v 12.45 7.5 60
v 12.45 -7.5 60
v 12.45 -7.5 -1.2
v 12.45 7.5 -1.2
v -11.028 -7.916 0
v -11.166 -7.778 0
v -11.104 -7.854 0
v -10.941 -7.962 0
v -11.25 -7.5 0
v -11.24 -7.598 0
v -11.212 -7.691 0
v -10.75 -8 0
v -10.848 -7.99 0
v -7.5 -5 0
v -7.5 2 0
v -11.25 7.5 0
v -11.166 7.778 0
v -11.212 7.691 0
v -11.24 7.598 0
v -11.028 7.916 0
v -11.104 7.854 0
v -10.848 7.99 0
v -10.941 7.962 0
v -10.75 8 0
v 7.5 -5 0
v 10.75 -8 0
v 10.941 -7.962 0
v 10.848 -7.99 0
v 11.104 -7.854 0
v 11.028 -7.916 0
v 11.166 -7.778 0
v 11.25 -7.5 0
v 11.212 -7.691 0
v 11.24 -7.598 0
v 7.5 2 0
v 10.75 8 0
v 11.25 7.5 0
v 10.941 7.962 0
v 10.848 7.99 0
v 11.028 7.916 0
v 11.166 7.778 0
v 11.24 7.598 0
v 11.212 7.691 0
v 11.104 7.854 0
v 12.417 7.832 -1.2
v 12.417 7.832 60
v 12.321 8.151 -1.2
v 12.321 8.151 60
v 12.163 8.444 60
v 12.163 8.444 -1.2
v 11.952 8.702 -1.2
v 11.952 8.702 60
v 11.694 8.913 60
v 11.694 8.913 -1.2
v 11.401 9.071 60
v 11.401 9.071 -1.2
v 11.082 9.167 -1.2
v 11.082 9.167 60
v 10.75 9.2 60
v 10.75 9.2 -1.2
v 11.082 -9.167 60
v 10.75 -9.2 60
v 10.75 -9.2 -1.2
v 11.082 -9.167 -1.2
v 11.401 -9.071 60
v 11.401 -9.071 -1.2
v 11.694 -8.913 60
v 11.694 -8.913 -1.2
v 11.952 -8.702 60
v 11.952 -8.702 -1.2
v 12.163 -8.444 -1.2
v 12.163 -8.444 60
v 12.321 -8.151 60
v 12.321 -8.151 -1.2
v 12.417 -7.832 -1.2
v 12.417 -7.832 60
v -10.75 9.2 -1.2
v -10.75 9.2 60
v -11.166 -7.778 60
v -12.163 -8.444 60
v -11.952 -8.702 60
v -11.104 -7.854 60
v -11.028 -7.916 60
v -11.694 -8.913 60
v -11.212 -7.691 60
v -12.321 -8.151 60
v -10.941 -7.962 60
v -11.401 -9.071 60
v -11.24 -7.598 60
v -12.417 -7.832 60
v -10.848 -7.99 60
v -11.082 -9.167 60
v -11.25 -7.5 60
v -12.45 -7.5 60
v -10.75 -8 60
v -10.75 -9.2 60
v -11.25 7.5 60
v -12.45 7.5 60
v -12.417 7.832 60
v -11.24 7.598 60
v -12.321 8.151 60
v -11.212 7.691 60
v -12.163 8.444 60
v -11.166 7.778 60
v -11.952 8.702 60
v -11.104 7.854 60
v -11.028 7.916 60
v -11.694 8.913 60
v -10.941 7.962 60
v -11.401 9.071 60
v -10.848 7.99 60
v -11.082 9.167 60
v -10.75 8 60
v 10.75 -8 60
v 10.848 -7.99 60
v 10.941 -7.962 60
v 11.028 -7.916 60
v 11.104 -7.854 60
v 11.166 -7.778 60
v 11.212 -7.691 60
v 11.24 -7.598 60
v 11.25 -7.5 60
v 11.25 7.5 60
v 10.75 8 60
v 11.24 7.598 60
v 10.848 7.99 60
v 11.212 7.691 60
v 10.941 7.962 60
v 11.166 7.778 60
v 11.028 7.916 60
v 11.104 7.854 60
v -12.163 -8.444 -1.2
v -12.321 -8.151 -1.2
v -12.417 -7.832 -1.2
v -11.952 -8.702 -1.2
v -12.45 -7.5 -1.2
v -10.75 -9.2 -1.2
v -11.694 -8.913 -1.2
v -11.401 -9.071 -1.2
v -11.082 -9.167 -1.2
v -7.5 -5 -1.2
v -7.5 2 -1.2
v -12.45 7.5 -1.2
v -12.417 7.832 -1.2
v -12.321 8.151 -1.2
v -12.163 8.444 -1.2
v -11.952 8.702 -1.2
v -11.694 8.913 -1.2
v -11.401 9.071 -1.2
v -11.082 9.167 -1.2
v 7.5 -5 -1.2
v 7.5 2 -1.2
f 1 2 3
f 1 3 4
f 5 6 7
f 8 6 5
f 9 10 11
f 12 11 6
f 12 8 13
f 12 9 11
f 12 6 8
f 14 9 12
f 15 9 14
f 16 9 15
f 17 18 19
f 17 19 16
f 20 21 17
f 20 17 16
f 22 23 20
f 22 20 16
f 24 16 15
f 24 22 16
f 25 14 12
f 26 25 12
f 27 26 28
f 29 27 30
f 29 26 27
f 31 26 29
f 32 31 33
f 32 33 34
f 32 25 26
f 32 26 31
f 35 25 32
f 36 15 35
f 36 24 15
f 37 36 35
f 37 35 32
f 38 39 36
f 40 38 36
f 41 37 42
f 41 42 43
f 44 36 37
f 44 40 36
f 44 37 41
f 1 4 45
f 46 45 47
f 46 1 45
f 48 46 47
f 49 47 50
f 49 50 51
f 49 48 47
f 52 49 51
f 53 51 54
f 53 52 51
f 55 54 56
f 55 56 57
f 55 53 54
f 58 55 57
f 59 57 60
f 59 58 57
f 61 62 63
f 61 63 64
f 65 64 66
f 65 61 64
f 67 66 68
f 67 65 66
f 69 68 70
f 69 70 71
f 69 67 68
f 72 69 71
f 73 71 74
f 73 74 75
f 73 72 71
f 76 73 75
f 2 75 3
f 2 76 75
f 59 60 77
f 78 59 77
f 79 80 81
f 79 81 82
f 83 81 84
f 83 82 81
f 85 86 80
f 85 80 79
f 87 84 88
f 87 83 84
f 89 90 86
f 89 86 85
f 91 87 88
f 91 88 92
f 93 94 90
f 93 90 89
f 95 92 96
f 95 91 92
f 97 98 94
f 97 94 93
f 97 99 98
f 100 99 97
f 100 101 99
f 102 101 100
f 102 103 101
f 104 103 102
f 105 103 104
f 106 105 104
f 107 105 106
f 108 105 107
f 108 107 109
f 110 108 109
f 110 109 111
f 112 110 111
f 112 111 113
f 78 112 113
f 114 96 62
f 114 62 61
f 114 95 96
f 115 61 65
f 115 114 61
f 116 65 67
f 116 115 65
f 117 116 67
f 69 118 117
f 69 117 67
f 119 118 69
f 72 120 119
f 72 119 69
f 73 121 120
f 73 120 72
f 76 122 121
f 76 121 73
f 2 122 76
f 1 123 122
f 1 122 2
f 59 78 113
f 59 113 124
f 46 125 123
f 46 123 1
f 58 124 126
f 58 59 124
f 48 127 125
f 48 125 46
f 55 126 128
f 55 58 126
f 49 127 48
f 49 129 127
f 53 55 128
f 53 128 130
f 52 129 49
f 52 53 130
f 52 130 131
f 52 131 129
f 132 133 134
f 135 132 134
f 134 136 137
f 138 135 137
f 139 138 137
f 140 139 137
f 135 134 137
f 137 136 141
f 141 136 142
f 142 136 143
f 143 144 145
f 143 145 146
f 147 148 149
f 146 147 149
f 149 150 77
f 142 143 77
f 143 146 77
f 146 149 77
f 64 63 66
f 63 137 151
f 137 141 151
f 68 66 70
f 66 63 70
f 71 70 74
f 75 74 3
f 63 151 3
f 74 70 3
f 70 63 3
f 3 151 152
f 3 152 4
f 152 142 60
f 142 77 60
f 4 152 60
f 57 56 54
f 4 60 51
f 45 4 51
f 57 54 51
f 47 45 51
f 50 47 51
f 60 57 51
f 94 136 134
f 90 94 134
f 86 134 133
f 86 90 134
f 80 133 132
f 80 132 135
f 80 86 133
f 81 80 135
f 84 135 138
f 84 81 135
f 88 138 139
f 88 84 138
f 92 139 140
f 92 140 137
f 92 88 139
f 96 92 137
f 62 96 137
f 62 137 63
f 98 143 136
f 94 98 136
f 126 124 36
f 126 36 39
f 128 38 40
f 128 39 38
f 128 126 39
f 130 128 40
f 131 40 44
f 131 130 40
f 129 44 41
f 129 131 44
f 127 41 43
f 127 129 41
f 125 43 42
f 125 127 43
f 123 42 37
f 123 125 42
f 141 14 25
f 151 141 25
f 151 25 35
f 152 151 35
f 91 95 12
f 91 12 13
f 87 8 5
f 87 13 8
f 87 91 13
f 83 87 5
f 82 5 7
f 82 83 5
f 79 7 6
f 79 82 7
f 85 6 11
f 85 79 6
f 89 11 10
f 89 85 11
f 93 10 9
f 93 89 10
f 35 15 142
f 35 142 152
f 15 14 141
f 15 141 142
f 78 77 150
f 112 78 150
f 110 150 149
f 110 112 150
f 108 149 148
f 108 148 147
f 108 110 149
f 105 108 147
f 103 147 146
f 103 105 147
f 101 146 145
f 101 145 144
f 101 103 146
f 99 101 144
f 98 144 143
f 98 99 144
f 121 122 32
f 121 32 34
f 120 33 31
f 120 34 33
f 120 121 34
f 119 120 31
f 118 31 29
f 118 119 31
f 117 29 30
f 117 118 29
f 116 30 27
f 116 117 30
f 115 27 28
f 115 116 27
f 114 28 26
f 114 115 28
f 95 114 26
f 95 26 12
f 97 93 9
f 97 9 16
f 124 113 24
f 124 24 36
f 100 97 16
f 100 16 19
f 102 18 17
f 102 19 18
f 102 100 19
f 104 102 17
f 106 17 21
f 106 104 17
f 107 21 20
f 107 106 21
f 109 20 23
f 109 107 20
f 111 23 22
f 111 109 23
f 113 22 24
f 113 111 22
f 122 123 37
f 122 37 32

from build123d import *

# Parameters (mm, degrees)
F1_DEPTH      = 60
F1_DEPTH_BACK = 1.2
F0_W          = 15
F0_H          = 7
F2_DEPTH      = 1.2


with BuildPart() as f1:
    # F0 (on Top) → F1 (new body, two sides)
    with BuildSketch(Plane.XY) as f1_sk:
        with BuildLine():
            Line((-12.45, 7.5), (-12.45, -7.5))
            ThreePointArc((-12.45, -7.5), (-11.952082, -8.702082), (-10.75, -9.2))
            Line((-10.75, -9.2), (10.75, -9.2))
            ThreePointArc((10.75, -9.2), (11.952082, -8.702082), (12.45, -7.5))
            Line((12.45, -7.5), (12.45, 7.5))
            ThreePointArc((12.45, 7.5), (11.952082, 8.702082), (10.75, 9.2))
            Line((10.75, 9.2), (-10.75, 9.2))
            ThreePointArc((-10.75, 9.2), (-11.952082, 8.702082), (-12.45, 7.5))
        make_face()
        with BuildLine():
            ThreePointArc((11.25, -7.5), (11.103553, -7.853553), (10.75, -8))
            Line((10.75, -8), (-10.75, -8))
            ThreePointArc((-10.75, -8), (-11.103553, -7.853553), (-11.25, -7.5))
            Line((-11.25, -7.5), (-11.25, 7.5))
            ThreePointArc((-11.25, 7.5), (-11.103553, 7.853553), (-10.75, 8))
            Line((-10.75, 8), (10.75, 8))
            ThreePointArc((10.75, 8), (11.103553, 7.853553), (11.25, 7.5))
            Line((11.25, 7.5), (11.25, -7.5))
        make_face(mode=Mode.SUBTRACT)
    extrude(amount=F1_DEPTH)
    extrude(f1_sk.sketch, amount=-F1_DEPTH_BACK)

    # F0 (on Top) → F2 (join)
    with BuildSketch(Plane.XY):
        with BuildLine():
            Line((-10.75, -8), (10.75, -8))
            ThreePointArc((10.75, -8), (11.103553, -7.853553), (11.25, -7.5))
            Line((11.25, -7.5), (11.25, 7.5))
            ThreePointArc((11.25, 7.5), (11.103553, 7.853553), (10.75, 8))
            Line((10.75, 8), (-10.75, 8))
            ThreePointArc((-10.75, 8), (-11.103553, 7.853553), (-11.25, 7.5))
            Line((-11.25, 7.5), (-11.25, -7.5))
            ThreePointArc((-11.25, -7.5), (-11.103553, -7.853553), (-10.75, -8))
        make_face()
        with Locations((0, -1.5)):
            Rectangle(F0_W, F0_H, mode=Mode.SUBTRACT)
    extrude(amount=-F2_DEPTH)


solid = f1.part
